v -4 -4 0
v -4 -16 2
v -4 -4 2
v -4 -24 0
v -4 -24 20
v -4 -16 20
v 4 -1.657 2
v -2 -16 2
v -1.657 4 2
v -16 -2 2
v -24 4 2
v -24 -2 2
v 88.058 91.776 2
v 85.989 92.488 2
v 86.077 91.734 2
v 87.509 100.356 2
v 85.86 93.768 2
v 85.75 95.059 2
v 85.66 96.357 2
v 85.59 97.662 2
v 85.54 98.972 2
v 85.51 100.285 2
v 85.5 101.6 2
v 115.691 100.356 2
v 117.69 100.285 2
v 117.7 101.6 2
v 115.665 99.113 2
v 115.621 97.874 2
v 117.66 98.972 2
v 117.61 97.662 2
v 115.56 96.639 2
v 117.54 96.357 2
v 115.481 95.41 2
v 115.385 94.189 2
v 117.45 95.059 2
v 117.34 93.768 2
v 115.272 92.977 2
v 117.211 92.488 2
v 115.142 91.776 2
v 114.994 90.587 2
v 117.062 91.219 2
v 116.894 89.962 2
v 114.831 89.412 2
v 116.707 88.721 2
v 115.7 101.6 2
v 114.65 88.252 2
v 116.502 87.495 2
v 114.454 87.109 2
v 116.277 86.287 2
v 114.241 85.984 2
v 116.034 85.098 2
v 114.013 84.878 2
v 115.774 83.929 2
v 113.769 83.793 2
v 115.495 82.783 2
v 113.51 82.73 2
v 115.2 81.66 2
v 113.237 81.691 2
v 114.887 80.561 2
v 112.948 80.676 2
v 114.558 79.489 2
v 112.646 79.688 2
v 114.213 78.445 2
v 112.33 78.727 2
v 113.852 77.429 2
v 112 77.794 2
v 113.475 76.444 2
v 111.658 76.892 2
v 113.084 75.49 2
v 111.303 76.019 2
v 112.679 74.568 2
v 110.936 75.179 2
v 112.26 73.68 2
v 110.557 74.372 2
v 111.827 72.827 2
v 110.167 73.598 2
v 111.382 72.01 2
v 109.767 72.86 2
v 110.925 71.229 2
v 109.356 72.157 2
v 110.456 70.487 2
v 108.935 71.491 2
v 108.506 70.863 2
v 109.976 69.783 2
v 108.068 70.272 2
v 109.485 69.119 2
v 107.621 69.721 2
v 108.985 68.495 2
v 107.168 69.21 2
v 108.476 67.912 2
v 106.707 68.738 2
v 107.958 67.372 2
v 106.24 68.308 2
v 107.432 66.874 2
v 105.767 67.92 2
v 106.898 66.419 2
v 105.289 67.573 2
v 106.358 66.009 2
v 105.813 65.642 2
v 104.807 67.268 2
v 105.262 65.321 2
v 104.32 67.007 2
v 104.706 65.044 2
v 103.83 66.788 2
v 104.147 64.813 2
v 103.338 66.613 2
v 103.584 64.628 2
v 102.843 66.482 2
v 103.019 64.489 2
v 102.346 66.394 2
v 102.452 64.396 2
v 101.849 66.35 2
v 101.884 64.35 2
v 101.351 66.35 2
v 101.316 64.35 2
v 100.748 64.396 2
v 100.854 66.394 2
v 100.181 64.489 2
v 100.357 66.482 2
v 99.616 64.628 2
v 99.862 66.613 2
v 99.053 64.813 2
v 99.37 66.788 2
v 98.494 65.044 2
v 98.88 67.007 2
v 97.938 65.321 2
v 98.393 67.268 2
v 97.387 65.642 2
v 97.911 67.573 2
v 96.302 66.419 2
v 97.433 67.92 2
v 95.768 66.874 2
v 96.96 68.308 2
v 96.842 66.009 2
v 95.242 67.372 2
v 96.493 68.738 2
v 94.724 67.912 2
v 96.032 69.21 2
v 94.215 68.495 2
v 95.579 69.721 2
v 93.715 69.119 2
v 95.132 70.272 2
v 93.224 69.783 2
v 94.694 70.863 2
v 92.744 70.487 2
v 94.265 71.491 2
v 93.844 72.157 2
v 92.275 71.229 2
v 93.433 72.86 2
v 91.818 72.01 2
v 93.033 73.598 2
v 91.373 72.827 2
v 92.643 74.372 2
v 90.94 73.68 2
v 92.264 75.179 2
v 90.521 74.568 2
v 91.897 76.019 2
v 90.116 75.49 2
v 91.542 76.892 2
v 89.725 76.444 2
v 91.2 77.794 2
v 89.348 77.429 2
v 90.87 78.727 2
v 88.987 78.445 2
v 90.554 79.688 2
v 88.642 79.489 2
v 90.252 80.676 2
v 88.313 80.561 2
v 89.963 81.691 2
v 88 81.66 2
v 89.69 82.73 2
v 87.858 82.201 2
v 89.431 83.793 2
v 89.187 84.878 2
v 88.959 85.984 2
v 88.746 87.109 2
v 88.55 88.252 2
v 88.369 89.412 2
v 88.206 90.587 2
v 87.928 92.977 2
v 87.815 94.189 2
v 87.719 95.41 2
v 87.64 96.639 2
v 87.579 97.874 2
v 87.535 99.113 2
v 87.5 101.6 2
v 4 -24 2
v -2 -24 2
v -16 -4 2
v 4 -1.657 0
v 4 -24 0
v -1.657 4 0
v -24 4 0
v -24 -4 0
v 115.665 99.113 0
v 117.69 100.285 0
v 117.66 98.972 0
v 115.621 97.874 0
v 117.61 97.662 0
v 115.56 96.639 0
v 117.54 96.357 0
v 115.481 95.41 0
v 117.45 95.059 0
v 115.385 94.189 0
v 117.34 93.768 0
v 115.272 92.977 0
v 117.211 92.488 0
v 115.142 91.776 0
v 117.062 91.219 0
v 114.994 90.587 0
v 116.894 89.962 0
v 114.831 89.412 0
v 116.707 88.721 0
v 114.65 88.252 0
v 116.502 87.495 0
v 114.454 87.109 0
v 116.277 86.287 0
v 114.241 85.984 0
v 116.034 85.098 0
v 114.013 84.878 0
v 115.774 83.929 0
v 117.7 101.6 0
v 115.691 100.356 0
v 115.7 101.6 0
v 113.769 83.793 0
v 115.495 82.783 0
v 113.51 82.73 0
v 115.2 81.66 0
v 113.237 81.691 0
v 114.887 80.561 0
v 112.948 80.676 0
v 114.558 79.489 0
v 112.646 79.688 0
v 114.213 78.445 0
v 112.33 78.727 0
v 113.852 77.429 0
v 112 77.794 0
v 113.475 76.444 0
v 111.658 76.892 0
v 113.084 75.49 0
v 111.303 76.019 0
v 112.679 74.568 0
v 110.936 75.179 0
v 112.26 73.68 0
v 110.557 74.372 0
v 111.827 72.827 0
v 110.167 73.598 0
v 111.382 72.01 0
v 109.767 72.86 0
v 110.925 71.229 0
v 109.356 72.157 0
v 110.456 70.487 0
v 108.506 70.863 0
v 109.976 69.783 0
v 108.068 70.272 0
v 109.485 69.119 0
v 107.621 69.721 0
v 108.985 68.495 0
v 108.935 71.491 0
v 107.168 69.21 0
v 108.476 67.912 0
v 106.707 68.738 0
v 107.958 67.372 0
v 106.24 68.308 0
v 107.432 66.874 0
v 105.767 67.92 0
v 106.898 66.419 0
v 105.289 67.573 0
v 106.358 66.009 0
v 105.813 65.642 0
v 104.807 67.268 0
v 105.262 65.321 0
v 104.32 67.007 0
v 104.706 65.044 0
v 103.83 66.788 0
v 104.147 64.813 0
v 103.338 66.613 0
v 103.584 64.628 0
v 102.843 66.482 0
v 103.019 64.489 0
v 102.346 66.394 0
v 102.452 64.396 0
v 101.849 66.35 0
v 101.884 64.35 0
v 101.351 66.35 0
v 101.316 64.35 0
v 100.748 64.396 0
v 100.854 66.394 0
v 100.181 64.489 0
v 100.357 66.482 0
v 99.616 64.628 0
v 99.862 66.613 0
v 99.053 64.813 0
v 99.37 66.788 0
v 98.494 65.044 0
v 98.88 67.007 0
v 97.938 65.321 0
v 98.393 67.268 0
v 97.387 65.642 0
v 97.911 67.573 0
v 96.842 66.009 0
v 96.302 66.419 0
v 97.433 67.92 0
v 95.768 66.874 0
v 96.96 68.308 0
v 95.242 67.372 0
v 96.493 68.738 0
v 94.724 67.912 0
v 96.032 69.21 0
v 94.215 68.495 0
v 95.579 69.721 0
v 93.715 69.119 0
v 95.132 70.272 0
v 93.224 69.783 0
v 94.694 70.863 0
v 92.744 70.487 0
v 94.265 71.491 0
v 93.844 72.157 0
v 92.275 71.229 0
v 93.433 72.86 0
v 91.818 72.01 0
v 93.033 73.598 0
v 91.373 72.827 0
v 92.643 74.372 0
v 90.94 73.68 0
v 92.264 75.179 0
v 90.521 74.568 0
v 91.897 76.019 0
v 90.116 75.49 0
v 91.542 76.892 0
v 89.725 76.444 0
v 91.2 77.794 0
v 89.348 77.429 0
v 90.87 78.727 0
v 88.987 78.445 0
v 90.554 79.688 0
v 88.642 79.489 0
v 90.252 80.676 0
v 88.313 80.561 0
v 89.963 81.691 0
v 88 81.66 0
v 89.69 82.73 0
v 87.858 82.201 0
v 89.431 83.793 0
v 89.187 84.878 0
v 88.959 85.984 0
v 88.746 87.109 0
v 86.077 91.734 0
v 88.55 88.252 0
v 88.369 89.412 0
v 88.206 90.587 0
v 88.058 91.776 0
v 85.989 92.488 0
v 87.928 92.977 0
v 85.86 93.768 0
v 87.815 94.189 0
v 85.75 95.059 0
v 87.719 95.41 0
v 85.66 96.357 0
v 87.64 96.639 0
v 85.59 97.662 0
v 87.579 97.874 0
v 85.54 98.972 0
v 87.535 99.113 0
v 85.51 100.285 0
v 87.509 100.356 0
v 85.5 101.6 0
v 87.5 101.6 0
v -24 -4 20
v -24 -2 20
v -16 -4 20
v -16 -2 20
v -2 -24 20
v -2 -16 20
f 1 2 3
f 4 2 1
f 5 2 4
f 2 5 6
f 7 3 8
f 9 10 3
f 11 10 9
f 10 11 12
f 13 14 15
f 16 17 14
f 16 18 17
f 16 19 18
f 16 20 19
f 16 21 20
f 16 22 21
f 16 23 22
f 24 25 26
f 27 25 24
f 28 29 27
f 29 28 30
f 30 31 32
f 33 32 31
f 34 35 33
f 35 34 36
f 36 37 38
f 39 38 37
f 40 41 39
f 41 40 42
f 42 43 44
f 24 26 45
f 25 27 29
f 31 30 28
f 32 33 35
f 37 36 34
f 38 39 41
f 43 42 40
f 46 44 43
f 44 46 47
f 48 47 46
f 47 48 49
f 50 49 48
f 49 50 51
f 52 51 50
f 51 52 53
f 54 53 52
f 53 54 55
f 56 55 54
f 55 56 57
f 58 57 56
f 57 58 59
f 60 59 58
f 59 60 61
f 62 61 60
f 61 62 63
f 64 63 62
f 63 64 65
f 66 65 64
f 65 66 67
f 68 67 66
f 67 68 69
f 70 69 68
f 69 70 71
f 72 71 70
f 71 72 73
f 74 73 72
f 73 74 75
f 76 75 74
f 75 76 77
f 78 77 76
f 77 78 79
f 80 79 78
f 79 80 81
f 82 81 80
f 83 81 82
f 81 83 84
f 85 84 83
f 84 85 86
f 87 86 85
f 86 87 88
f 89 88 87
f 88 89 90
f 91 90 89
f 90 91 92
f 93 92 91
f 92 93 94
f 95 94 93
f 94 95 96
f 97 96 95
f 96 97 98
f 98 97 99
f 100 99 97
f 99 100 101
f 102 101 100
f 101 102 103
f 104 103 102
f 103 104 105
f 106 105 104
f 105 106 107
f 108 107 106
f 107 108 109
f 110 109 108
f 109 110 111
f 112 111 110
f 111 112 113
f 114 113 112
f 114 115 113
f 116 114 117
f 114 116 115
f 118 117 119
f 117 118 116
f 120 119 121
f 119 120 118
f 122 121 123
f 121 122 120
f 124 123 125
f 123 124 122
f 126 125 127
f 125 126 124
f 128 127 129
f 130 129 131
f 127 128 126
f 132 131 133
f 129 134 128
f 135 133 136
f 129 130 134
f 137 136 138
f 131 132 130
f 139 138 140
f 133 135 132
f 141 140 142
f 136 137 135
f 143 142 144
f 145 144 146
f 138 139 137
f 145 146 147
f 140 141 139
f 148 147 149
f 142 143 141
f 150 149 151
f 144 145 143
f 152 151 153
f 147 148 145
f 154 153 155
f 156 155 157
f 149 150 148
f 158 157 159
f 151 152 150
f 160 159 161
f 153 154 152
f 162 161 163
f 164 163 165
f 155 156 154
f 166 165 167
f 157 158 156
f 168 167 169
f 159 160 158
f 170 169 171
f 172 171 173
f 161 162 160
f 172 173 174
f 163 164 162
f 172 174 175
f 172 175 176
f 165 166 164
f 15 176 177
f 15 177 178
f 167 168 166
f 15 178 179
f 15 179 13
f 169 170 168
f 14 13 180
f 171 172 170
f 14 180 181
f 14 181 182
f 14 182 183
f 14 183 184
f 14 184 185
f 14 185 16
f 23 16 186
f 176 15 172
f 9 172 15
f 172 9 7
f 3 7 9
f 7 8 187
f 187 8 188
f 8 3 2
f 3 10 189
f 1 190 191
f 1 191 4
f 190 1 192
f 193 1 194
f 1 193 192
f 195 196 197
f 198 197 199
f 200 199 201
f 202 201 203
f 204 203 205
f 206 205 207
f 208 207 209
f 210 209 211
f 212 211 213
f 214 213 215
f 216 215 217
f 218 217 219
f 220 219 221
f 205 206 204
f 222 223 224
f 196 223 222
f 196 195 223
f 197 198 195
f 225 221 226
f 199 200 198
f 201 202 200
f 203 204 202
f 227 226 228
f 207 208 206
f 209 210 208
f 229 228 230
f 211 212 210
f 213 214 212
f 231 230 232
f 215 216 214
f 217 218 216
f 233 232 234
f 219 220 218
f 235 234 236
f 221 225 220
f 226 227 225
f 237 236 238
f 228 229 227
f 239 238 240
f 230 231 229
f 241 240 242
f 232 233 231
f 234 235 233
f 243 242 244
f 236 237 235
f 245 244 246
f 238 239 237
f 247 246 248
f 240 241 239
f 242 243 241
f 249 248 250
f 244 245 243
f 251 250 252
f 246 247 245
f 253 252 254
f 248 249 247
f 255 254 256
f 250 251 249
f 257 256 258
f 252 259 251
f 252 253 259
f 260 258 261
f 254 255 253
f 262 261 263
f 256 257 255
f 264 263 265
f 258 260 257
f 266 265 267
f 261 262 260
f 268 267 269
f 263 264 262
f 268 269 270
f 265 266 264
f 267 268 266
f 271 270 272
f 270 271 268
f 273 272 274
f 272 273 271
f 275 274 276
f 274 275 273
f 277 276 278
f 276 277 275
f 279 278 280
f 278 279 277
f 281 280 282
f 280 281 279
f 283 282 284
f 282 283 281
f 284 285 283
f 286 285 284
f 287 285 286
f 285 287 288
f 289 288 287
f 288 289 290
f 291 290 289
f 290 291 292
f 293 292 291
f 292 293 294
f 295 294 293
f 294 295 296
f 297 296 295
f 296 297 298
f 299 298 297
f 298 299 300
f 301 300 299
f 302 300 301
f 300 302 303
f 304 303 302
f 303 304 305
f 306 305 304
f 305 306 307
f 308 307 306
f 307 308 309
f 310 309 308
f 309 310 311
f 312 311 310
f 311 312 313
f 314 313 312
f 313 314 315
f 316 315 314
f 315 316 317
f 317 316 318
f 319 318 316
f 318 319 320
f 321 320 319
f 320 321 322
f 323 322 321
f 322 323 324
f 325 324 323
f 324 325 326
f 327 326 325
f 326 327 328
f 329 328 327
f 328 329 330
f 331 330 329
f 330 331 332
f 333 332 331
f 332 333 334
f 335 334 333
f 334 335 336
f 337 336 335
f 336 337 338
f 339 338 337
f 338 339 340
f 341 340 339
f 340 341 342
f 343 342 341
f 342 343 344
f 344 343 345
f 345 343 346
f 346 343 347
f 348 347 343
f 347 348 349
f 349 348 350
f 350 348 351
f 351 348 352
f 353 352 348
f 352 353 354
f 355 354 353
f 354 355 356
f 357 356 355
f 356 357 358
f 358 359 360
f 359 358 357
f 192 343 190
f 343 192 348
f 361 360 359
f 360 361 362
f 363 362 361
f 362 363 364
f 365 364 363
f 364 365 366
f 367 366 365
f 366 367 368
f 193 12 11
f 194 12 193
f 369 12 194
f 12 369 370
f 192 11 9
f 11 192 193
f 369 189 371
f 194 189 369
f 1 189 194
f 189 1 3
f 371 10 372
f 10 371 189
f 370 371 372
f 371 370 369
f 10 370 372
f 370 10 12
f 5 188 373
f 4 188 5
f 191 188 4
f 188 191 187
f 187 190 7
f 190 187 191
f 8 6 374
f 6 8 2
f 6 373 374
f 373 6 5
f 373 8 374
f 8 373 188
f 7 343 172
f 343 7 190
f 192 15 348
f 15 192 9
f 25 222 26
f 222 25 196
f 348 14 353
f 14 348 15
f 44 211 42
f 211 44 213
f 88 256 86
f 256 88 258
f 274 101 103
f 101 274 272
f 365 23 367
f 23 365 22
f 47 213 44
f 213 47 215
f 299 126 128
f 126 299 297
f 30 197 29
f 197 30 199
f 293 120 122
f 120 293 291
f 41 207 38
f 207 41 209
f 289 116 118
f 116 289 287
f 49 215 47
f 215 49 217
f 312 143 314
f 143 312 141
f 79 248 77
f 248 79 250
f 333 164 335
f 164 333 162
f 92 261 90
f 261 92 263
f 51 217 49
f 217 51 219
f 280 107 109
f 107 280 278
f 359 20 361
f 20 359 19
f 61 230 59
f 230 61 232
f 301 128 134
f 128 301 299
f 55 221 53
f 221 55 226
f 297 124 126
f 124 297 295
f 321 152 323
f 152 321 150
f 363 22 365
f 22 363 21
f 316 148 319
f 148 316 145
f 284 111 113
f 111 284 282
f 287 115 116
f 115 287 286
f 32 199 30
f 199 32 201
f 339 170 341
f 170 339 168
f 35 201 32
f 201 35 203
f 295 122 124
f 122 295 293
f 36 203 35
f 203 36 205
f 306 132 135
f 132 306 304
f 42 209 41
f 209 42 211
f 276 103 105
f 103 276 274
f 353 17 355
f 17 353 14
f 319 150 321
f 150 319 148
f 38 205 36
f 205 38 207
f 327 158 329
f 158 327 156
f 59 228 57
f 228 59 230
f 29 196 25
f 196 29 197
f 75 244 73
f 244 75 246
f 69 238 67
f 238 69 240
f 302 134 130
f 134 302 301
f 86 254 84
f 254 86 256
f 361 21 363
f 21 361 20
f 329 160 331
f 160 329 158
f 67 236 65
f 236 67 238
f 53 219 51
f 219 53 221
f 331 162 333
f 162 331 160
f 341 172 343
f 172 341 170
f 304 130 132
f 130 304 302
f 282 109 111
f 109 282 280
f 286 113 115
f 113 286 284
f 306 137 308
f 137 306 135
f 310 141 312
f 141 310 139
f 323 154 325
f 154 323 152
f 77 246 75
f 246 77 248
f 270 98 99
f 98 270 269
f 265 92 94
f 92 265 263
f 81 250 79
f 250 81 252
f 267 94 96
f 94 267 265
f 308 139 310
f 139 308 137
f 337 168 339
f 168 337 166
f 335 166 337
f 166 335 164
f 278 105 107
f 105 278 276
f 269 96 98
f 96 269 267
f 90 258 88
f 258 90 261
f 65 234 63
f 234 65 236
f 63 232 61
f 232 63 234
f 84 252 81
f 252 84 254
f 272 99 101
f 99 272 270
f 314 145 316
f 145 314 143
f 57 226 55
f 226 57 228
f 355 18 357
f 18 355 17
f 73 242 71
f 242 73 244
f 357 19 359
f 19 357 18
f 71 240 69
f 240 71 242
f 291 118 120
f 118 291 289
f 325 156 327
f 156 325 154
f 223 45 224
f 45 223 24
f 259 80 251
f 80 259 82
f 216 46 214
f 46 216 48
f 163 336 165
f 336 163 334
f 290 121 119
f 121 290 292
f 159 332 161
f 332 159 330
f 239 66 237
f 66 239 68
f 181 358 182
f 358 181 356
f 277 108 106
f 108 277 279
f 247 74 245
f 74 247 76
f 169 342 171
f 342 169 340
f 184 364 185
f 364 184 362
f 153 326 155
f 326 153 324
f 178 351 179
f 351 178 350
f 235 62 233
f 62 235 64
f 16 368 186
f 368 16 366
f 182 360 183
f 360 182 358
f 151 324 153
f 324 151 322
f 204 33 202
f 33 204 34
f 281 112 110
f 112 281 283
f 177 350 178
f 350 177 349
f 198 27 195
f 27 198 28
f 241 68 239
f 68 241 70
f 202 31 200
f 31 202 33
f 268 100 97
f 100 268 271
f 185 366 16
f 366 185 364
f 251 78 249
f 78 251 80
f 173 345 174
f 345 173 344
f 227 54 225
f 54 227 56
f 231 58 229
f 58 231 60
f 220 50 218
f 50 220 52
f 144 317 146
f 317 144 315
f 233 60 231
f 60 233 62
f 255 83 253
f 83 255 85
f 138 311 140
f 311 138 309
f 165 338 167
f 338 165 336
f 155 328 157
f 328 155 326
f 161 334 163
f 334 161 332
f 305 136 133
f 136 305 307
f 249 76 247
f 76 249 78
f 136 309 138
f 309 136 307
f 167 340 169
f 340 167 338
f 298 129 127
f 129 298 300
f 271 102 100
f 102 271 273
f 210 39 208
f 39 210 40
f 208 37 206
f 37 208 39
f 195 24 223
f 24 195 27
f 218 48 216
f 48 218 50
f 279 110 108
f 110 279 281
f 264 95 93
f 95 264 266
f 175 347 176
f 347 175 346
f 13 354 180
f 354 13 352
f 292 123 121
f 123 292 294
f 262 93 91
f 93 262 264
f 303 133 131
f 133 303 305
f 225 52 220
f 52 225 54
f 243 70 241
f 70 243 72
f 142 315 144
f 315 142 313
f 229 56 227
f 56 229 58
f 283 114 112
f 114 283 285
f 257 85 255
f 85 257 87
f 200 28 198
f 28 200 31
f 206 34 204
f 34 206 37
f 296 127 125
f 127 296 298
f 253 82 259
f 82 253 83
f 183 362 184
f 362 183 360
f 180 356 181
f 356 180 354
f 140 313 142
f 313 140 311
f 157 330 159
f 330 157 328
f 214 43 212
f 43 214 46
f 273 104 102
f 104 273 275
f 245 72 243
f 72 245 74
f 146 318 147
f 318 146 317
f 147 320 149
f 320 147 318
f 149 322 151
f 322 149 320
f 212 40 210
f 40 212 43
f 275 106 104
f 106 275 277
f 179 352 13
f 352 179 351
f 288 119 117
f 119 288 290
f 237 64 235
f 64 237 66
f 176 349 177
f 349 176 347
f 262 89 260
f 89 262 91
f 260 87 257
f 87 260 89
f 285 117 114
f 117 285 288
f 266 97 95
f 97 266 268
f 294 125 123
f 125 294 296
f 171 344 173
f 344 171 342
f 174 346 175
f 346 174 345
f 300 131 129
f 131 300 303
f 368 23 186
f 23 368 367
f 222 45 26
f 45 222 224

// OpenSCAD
// file: ../lib/jig.scad
default_thickness = 2;

// A guide arm that goes into one side of a windowsill corner.
module curtain_guide(guide_width, guide_length, thickness) {
  translate([-(guide_length/2), -(guide_width/2), 0])
    cube([guide_length, guide_width, thickness]);

  translate([-(guide_length/2), -(guide_width/2), 0])
    cube([guide_width, thickness, guide_length]);
}

// Two guide arms, one for each side of a windowsill corner.
module curtain_guides(guide_width, guide_length, thickness)
{
  // Left arm:
  translate([ -(guide_length/2 + guide_width/2), 0, 0])
    curtain_guide(guide_width, guide_length, thickness);

  // Right arm:
  translate([0, -(guide_length/2 + guide_width/2), 0])
    rotate([0, 0, -90])
    mirror([1, 0, 0])
    curtain_guide(guide_width, guide_length, thickness);

  // Connection point.
  translate([0, 0, thickness/2])
    cube([guide_width, guide_width, thickness], center=true);
}

// https://en.wikipedia.org/wiki/Solution_of_triangles#Two_sides_and_the_included_angle_given_(SAS)
function curtain_sas(A, b, c) =
  let ( a = sqrt(pow(b, 2) + pow(c, 2) - (2 * b * c * cos(A)))
      , B = acos((pow(c, 2) + pow(a, 2) - pow(b, 2)) / (2 * c * a))
      , C = 180 - B - A
      )
  [a, B, C];

// Construct an arm to offset the hole jig.
/*
      Target Holder Location
               /|
              / |
             /  |
            / B |
           /    | <- Vertical offset
       a  /     |
         /      |
        /       | c
       /        |
      /         |
     /          |
    /           |
   / C        A |
   \____________/
         b

  Horizontal offset

*/
module curtain_offset_arm(horizontal_offset, vertical_offset, width, thickness)
{
  saa = curtain_sas(90, horizontal_offset, vertical_offset);
  length = saa[0];
  angle = -saa[2];

  difference() {
    rotate([0, 0, angle])
      translate([-(width/2), 0, 0])
      cube([width, length, thickness]);

    union() {
      translate([0, vertical_offset, -0.1])
        cube([horizontal_offset + width, width, thickness + 0.2]);

      translate([horizontal_offset, 0, -0.1])
        cube([width, vertical_offset, thickness + 0.2]);
    }
  }
}

// A curtain hanger jig with an arm that points to the center of where
// the rod hanger should go.
module curtain_hanger_jig(
  horizontal_offset,
  vertical_offset,
  thickness = default_thickness)
{
  guide_width = 8;
  guide_length = 20;

  curtain_guides(guide_width, guide_length, thickness);
  curtain_offset_arm(horizontal_offset, vertical_offset, guide_width, thickness);
}
// file: ../lib/hangers.scad
include <jig.scad>

// The solid shape of an oval hanger.
module curtain_oval_holder_shape(width, height, thickness)
{
  resize(newsize=[0, height, 0])
    linear_extrude(height=thickness)
    circle(d=width);
}

// An oval-shaped curtain rod hanger.
module curtain_oval_holder(
  // Distance from the windowsill to the center of the hanger in the
  // horizontal direction.
  horizontal_offset,

  // Distance from the windowsill to the center of the hanger in the
  // vertical direction.
  vertical_offset,

  // How wide is the oval hanger at its widest?
  width,

  // How tall is the oval hanger?
  height,

  // How think to make the jig.
  thickness=default_thickness)
{
  difference() {
    union() {
      curtain_hanger_jig(horizontal_offset, vertical_offset, thickness);

      translate([horizontal_offset, vertical_offset, 0])
        resize(newsize=[width+thickness*2, height+thickness*2, 0])
        curtain_oval_holder_shape(width, height, thickness);
    }

    translate([horizontal_offset, vertical_offset, 0]) {
      curtain_oval_holder_shape(width, height, thickness);
      translate([-(horizontal_offset/2), 0, 0])
        cube([horizontal_offset, vertical_offset, thickness]);
    }
  }
}
// main file
$fa = 1.0;
$fs = 0.5;

use <../lib/hangers.scad>

windowsill_offset = 101.6; // 4"
hanger_width = 28.2;
hanger_height = 70.5;

curtain_oval_holder(
  windowsill_offset,
  windowsill_offset,
  hanger_width,
  hanger_height);
